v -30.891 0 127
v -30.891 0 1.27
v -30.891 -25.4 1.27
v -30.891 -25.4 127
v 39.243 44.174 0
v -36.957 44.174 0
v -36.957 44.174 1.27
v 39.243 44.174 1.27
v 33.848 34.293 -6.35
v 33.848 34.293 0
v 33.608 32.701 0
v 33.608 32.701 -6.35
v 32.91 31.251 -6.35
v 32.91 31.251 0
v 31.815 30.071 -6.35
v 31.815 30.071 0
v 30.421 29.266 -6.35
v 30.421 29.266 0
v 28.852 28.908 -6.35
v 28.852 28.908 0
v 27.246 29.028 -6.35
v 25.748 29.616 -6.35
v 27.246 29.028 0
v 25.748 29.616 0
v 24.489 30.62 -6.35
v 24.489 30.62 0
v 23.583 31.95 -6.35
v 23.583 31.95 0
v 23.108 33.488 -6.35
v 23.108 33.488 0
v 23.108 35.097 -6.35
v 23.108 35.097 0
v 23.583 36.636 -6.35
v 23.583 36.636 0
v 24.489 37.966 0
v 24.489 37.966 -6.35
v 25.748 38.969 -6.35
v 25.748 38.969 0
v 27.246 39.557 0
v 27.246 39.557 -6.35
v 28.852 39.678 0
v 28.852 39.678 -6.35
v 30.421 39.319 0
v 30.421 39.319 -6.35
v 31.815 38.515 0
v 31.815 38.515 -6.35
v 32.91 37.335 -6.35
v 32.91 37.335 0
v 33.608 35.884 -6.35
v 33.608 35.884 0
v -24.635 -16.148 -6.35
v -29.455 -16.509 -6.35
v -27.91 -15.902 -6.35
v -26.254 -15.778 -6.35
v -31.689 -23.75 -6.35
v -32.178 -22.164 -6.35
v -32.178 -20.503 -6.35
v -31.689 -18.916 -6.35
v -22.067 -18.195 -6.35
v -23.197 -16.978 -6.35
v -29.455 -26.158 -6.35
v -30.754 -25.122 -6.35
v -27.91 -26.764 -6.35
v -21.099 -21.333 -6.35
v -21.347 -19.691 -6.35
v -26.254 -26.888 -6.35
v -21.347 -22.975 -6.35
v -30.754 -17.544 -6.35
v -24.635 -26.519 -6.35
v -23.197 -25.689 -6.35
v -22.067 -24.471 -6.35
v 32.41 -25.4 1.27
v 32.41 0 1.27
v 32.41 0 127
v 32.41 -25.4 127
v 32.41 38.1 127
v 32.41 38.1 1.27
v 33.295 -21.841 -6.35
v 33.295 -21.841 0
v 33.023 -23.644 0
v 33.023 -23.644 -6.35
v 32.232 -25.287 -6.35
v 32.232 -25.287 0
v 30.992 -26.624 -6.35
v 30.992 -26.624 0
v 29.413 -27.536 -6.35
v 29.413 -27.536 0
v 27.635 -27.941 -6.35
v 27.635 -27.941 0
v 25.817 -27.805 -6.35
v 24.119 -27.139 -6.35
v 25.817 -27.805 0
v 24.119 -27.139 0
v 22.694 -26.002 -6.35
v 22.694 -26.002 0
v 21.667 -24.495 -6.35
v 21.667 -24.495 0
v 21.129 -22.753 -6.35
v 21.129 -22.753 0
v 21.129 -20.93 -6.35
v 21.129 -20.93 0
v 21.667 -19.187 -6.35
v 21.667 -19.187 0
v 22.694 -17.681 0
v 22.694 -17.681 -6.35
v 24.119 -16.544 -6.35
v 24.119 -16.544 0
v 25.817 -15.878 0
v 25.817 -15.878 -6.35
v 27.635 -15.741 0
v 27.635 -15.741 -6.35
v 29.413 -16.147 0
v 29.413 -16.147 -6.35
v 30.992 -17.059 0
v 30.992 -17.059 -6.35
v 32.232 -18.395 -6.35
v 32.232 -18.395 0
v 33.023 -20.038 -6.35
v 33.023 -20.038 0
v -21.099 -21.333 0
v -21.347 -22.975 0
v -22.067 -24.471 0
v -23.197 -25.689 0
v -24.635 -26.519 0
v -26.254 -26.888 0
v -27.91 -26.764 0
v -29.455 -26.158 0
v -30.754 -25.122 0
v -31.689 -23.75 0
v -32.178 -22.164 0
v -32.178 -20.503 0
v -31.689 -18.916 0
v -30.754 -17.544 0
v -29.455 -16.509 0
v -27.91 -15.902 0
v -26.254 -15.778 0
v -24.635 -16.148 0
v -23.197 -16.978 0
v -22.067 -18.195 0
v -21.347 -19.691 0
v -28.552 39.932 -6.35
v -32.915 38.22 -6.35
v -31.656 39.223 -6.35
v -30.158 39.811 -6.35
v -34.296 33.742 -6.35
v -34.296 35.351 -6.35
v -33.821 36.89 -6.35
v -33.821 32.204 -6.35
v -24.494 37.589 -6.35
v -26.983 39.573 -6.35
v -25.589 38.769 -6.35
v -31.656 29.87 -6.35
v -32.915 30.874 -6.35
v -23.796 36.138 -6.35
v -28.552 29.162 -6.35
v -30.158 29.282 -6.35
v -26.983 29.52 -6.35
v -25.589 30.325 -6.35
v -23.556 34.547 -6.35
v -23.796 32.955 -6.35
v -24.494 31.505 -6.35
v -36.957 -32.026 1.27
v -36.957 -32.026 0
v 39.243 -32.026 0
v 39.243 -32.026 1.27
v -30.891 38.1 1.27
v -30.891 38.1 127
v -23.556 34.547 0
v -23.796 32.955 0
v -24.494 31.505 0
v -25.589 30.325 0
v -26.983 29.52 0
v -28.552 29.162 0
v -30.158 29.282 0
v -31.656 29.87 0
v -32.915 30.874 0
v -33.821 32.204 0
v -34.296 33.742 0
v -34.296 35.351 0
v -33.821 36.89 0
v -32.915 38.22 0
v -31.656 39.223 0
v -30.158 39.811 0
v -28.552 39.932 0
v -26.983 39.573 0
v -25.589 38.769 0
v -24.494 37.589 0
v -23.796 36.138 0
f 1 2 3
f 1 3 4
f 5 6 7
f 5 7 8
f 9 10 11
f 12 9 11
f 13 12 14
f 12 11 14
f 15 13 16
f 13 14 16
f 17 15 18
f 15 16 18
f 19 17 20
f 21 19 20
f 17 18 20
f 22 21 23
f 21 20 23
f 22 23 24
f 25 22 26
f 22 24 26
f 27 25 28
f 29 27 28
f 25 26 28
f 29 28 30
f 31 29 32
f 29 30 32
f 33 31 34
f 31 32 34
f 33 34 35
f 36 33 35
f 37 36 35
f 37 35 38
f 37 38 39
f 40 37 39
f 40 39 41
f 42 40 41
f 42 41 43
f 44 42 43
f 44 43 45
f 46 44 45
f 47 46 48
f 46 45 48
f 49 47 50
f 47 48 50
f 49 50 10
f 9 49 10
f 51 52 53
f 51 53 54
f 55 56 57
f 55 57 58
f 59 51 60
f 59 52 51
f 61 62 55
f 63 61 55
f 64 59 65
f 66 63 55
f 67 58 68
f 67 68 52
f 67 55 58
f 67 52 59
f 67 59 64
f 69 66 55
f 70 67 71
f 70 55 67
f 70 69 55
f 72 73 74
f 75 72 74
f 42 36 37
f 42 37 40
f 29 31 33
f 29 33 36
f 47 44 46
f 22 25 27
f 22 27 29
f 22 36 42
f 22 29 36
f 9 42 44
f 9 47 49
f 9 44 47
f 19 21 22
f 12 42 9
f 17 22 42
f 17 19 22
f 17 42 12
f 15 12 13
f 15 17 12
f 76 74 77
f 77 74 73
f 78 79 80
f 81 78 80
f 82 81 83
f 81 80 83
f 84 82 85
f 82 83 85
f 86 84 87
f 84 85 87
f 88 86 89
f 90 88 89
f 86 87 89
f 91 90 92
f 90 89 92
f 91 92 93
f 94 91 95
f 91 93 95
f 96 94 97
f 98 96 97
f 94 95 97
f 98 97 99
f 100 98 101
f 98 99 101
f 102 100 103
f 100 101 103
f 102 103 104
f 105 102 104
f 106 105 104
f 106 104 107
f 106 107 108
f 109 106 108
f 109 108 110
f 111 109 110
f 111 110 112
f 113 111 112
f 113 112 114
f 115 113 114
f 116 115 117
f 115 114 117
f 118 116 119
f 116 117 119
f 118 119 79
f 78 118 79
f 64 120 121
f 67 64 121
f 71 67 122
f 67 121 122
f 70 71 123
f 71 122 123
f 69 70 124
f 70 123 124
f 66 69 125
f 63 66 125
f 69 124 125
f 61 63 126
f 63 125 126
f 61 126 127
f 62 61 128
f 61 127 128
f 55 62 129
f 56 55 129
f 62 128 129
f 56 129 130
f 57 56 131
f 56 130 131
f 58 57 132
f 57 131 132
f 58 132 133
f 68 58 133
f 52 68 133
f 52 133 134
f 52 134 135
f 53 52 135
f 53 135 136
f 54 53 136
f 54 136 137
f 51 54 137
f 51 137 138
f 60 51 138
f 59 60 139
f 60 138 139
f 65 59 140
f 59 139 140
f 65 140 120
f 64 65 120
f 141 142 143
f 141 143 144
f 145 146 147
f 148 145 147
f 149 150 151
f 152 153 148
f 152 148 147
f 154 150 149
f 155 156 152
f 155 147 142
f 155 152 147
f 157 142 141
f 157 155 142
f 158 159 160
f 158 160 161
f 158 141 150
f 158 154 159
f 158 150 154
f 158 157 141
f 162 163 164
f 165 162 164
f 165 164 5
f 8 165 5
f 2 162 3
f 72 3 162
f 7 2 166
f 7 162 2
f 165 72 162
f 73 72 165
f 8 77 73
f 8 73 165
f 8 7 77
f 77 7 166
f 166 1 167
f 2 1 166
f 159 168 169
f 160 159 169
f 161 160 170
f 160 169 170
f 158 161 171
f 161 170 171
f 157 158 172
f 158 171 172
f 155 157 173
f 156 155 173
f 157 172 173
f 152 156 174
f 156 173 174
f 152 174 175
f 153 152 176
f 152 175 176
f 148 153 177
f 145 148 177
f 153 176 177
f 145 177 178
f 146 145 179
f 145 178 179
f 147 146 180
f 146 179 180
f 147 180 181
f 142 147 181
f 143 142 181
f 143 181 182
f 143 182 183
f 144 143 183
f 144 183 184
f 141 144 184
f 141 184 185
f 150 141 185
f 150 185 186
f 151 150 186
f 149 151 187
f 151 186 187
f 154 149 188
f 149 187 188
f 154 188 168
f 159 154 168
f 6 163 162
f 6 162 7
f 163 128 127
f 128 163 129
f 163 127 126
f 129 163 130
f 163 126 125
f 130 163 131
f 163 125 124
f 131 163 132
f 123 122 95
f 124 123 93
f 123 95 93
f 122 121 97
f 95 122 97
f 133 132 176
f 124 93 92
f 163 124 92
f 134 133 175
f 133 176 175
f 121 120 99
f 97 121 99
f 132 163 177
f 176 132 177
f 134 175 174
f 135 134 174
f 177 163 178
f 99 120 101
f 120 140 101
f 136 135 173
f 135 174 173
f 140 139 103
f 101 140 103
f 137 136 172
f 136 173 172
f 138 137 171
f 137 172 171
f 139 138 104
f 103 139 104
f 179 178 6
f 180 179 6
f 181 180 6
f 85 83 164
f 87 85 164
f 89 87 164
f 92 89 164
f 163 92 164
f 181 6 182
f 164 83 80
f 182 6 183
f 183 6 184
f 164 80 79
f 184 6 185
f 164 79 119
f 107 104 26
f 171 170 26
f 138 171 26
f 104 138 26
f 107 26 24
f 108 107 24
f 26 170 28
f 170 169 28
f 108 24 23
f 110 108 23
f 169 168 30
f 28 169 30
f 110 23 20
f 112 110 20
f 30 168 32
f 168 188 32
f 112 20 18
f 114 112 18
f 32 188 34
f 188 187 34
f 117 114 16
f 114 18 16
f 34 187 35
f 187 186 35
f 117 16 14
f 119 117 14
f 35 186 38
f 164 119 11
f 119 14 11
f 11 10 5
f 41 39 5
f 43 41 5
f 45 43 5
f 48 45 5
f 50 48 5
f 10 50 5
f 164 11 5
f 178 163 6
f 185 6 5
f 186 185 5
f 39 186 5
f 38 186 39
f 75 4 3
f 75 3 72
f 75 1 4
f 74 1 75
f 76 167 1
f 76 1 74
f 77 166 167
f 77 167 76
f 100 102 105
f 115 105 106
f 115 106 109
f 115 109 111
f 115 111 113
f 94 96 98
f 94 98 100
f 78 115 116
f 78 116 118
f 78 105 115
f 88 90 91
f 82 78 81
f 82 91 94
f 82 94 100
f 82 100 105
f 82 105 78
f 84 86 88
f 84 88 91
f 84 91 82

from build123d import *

# Parameters (mm, degrees)
F1_W      = 63.300895
F1_H      = 127
F2_DEPTH  = 25.4
F2_FACE_W = 63.300894
F2_FACE_H = 127
F3_DEPTH  = 38.1
F0_W      = 76.2
F0_H      = 76.2
F0_W_2    = 63.5
F0_H_2    = 63.5
F4_DEPTH  = 1.27
F5_R      = 5.570657
F5_R_2    = 6.11713
F5_R_3    = 5.40011
F5_R_4    = 5.400115
F6_DEPTH  = 6.35


with BuildPart() as f2:
    # F1 (on Front) → F2 (new body)
    with BuildSketch(Plane.XZ):
        with Locations((0.75961, 63.5)):
            Rectangle(F1_W, F1_H)
    extrude(amount=F2_DEPTH)

    # F2_face (on face) → F3 (join)
    with BuildSketch(Plane(origin=(0.75961, 0, 63.5), x_dir=(1, 0, 0), z_dir=(0, 1, 0))):
        Rectangle(F2_FACE_W, F2_FACE_H)
    extrude(amount=F3_DEPTH)

    # F0 (on Top) → F4 (join)
    with BuildSketch(Plane.XY):
        with Locations((1.143001, 6.07413)):
            Rectangle(F0_W, F0_H)
        with Locations((1.143001, 6.07413)):
            Rectangle(F0_W_2, F0_H_2, mode=Mode.SUBTRACT)
        with Locations((1.143001, 6.07413)):
            Rectangle(F0_W_2, F0_H_2)
    extrude(amount=F4_DEPTH)

    # F5 (on face) → F6 (join)
    with BuildSketch(Plane(origin=(0, 0, 0), x_dir=(1, 0, 0), z_dir=(0, 0, -1))):
        with Locations((-26.67, 21.333355)):
            Circle(F5_R)
        with Locations((27.178001, 21.841355)):
            Circle(F5_R_2)
        with Locations((28.448002, -34.292646)):
            Circle(F5_R_3)
        with Locations((-28.956, -34.546643)):
            Circle(F5_R_4)
    extrude(amount=F6_DEPTH)


solid = f2.part
